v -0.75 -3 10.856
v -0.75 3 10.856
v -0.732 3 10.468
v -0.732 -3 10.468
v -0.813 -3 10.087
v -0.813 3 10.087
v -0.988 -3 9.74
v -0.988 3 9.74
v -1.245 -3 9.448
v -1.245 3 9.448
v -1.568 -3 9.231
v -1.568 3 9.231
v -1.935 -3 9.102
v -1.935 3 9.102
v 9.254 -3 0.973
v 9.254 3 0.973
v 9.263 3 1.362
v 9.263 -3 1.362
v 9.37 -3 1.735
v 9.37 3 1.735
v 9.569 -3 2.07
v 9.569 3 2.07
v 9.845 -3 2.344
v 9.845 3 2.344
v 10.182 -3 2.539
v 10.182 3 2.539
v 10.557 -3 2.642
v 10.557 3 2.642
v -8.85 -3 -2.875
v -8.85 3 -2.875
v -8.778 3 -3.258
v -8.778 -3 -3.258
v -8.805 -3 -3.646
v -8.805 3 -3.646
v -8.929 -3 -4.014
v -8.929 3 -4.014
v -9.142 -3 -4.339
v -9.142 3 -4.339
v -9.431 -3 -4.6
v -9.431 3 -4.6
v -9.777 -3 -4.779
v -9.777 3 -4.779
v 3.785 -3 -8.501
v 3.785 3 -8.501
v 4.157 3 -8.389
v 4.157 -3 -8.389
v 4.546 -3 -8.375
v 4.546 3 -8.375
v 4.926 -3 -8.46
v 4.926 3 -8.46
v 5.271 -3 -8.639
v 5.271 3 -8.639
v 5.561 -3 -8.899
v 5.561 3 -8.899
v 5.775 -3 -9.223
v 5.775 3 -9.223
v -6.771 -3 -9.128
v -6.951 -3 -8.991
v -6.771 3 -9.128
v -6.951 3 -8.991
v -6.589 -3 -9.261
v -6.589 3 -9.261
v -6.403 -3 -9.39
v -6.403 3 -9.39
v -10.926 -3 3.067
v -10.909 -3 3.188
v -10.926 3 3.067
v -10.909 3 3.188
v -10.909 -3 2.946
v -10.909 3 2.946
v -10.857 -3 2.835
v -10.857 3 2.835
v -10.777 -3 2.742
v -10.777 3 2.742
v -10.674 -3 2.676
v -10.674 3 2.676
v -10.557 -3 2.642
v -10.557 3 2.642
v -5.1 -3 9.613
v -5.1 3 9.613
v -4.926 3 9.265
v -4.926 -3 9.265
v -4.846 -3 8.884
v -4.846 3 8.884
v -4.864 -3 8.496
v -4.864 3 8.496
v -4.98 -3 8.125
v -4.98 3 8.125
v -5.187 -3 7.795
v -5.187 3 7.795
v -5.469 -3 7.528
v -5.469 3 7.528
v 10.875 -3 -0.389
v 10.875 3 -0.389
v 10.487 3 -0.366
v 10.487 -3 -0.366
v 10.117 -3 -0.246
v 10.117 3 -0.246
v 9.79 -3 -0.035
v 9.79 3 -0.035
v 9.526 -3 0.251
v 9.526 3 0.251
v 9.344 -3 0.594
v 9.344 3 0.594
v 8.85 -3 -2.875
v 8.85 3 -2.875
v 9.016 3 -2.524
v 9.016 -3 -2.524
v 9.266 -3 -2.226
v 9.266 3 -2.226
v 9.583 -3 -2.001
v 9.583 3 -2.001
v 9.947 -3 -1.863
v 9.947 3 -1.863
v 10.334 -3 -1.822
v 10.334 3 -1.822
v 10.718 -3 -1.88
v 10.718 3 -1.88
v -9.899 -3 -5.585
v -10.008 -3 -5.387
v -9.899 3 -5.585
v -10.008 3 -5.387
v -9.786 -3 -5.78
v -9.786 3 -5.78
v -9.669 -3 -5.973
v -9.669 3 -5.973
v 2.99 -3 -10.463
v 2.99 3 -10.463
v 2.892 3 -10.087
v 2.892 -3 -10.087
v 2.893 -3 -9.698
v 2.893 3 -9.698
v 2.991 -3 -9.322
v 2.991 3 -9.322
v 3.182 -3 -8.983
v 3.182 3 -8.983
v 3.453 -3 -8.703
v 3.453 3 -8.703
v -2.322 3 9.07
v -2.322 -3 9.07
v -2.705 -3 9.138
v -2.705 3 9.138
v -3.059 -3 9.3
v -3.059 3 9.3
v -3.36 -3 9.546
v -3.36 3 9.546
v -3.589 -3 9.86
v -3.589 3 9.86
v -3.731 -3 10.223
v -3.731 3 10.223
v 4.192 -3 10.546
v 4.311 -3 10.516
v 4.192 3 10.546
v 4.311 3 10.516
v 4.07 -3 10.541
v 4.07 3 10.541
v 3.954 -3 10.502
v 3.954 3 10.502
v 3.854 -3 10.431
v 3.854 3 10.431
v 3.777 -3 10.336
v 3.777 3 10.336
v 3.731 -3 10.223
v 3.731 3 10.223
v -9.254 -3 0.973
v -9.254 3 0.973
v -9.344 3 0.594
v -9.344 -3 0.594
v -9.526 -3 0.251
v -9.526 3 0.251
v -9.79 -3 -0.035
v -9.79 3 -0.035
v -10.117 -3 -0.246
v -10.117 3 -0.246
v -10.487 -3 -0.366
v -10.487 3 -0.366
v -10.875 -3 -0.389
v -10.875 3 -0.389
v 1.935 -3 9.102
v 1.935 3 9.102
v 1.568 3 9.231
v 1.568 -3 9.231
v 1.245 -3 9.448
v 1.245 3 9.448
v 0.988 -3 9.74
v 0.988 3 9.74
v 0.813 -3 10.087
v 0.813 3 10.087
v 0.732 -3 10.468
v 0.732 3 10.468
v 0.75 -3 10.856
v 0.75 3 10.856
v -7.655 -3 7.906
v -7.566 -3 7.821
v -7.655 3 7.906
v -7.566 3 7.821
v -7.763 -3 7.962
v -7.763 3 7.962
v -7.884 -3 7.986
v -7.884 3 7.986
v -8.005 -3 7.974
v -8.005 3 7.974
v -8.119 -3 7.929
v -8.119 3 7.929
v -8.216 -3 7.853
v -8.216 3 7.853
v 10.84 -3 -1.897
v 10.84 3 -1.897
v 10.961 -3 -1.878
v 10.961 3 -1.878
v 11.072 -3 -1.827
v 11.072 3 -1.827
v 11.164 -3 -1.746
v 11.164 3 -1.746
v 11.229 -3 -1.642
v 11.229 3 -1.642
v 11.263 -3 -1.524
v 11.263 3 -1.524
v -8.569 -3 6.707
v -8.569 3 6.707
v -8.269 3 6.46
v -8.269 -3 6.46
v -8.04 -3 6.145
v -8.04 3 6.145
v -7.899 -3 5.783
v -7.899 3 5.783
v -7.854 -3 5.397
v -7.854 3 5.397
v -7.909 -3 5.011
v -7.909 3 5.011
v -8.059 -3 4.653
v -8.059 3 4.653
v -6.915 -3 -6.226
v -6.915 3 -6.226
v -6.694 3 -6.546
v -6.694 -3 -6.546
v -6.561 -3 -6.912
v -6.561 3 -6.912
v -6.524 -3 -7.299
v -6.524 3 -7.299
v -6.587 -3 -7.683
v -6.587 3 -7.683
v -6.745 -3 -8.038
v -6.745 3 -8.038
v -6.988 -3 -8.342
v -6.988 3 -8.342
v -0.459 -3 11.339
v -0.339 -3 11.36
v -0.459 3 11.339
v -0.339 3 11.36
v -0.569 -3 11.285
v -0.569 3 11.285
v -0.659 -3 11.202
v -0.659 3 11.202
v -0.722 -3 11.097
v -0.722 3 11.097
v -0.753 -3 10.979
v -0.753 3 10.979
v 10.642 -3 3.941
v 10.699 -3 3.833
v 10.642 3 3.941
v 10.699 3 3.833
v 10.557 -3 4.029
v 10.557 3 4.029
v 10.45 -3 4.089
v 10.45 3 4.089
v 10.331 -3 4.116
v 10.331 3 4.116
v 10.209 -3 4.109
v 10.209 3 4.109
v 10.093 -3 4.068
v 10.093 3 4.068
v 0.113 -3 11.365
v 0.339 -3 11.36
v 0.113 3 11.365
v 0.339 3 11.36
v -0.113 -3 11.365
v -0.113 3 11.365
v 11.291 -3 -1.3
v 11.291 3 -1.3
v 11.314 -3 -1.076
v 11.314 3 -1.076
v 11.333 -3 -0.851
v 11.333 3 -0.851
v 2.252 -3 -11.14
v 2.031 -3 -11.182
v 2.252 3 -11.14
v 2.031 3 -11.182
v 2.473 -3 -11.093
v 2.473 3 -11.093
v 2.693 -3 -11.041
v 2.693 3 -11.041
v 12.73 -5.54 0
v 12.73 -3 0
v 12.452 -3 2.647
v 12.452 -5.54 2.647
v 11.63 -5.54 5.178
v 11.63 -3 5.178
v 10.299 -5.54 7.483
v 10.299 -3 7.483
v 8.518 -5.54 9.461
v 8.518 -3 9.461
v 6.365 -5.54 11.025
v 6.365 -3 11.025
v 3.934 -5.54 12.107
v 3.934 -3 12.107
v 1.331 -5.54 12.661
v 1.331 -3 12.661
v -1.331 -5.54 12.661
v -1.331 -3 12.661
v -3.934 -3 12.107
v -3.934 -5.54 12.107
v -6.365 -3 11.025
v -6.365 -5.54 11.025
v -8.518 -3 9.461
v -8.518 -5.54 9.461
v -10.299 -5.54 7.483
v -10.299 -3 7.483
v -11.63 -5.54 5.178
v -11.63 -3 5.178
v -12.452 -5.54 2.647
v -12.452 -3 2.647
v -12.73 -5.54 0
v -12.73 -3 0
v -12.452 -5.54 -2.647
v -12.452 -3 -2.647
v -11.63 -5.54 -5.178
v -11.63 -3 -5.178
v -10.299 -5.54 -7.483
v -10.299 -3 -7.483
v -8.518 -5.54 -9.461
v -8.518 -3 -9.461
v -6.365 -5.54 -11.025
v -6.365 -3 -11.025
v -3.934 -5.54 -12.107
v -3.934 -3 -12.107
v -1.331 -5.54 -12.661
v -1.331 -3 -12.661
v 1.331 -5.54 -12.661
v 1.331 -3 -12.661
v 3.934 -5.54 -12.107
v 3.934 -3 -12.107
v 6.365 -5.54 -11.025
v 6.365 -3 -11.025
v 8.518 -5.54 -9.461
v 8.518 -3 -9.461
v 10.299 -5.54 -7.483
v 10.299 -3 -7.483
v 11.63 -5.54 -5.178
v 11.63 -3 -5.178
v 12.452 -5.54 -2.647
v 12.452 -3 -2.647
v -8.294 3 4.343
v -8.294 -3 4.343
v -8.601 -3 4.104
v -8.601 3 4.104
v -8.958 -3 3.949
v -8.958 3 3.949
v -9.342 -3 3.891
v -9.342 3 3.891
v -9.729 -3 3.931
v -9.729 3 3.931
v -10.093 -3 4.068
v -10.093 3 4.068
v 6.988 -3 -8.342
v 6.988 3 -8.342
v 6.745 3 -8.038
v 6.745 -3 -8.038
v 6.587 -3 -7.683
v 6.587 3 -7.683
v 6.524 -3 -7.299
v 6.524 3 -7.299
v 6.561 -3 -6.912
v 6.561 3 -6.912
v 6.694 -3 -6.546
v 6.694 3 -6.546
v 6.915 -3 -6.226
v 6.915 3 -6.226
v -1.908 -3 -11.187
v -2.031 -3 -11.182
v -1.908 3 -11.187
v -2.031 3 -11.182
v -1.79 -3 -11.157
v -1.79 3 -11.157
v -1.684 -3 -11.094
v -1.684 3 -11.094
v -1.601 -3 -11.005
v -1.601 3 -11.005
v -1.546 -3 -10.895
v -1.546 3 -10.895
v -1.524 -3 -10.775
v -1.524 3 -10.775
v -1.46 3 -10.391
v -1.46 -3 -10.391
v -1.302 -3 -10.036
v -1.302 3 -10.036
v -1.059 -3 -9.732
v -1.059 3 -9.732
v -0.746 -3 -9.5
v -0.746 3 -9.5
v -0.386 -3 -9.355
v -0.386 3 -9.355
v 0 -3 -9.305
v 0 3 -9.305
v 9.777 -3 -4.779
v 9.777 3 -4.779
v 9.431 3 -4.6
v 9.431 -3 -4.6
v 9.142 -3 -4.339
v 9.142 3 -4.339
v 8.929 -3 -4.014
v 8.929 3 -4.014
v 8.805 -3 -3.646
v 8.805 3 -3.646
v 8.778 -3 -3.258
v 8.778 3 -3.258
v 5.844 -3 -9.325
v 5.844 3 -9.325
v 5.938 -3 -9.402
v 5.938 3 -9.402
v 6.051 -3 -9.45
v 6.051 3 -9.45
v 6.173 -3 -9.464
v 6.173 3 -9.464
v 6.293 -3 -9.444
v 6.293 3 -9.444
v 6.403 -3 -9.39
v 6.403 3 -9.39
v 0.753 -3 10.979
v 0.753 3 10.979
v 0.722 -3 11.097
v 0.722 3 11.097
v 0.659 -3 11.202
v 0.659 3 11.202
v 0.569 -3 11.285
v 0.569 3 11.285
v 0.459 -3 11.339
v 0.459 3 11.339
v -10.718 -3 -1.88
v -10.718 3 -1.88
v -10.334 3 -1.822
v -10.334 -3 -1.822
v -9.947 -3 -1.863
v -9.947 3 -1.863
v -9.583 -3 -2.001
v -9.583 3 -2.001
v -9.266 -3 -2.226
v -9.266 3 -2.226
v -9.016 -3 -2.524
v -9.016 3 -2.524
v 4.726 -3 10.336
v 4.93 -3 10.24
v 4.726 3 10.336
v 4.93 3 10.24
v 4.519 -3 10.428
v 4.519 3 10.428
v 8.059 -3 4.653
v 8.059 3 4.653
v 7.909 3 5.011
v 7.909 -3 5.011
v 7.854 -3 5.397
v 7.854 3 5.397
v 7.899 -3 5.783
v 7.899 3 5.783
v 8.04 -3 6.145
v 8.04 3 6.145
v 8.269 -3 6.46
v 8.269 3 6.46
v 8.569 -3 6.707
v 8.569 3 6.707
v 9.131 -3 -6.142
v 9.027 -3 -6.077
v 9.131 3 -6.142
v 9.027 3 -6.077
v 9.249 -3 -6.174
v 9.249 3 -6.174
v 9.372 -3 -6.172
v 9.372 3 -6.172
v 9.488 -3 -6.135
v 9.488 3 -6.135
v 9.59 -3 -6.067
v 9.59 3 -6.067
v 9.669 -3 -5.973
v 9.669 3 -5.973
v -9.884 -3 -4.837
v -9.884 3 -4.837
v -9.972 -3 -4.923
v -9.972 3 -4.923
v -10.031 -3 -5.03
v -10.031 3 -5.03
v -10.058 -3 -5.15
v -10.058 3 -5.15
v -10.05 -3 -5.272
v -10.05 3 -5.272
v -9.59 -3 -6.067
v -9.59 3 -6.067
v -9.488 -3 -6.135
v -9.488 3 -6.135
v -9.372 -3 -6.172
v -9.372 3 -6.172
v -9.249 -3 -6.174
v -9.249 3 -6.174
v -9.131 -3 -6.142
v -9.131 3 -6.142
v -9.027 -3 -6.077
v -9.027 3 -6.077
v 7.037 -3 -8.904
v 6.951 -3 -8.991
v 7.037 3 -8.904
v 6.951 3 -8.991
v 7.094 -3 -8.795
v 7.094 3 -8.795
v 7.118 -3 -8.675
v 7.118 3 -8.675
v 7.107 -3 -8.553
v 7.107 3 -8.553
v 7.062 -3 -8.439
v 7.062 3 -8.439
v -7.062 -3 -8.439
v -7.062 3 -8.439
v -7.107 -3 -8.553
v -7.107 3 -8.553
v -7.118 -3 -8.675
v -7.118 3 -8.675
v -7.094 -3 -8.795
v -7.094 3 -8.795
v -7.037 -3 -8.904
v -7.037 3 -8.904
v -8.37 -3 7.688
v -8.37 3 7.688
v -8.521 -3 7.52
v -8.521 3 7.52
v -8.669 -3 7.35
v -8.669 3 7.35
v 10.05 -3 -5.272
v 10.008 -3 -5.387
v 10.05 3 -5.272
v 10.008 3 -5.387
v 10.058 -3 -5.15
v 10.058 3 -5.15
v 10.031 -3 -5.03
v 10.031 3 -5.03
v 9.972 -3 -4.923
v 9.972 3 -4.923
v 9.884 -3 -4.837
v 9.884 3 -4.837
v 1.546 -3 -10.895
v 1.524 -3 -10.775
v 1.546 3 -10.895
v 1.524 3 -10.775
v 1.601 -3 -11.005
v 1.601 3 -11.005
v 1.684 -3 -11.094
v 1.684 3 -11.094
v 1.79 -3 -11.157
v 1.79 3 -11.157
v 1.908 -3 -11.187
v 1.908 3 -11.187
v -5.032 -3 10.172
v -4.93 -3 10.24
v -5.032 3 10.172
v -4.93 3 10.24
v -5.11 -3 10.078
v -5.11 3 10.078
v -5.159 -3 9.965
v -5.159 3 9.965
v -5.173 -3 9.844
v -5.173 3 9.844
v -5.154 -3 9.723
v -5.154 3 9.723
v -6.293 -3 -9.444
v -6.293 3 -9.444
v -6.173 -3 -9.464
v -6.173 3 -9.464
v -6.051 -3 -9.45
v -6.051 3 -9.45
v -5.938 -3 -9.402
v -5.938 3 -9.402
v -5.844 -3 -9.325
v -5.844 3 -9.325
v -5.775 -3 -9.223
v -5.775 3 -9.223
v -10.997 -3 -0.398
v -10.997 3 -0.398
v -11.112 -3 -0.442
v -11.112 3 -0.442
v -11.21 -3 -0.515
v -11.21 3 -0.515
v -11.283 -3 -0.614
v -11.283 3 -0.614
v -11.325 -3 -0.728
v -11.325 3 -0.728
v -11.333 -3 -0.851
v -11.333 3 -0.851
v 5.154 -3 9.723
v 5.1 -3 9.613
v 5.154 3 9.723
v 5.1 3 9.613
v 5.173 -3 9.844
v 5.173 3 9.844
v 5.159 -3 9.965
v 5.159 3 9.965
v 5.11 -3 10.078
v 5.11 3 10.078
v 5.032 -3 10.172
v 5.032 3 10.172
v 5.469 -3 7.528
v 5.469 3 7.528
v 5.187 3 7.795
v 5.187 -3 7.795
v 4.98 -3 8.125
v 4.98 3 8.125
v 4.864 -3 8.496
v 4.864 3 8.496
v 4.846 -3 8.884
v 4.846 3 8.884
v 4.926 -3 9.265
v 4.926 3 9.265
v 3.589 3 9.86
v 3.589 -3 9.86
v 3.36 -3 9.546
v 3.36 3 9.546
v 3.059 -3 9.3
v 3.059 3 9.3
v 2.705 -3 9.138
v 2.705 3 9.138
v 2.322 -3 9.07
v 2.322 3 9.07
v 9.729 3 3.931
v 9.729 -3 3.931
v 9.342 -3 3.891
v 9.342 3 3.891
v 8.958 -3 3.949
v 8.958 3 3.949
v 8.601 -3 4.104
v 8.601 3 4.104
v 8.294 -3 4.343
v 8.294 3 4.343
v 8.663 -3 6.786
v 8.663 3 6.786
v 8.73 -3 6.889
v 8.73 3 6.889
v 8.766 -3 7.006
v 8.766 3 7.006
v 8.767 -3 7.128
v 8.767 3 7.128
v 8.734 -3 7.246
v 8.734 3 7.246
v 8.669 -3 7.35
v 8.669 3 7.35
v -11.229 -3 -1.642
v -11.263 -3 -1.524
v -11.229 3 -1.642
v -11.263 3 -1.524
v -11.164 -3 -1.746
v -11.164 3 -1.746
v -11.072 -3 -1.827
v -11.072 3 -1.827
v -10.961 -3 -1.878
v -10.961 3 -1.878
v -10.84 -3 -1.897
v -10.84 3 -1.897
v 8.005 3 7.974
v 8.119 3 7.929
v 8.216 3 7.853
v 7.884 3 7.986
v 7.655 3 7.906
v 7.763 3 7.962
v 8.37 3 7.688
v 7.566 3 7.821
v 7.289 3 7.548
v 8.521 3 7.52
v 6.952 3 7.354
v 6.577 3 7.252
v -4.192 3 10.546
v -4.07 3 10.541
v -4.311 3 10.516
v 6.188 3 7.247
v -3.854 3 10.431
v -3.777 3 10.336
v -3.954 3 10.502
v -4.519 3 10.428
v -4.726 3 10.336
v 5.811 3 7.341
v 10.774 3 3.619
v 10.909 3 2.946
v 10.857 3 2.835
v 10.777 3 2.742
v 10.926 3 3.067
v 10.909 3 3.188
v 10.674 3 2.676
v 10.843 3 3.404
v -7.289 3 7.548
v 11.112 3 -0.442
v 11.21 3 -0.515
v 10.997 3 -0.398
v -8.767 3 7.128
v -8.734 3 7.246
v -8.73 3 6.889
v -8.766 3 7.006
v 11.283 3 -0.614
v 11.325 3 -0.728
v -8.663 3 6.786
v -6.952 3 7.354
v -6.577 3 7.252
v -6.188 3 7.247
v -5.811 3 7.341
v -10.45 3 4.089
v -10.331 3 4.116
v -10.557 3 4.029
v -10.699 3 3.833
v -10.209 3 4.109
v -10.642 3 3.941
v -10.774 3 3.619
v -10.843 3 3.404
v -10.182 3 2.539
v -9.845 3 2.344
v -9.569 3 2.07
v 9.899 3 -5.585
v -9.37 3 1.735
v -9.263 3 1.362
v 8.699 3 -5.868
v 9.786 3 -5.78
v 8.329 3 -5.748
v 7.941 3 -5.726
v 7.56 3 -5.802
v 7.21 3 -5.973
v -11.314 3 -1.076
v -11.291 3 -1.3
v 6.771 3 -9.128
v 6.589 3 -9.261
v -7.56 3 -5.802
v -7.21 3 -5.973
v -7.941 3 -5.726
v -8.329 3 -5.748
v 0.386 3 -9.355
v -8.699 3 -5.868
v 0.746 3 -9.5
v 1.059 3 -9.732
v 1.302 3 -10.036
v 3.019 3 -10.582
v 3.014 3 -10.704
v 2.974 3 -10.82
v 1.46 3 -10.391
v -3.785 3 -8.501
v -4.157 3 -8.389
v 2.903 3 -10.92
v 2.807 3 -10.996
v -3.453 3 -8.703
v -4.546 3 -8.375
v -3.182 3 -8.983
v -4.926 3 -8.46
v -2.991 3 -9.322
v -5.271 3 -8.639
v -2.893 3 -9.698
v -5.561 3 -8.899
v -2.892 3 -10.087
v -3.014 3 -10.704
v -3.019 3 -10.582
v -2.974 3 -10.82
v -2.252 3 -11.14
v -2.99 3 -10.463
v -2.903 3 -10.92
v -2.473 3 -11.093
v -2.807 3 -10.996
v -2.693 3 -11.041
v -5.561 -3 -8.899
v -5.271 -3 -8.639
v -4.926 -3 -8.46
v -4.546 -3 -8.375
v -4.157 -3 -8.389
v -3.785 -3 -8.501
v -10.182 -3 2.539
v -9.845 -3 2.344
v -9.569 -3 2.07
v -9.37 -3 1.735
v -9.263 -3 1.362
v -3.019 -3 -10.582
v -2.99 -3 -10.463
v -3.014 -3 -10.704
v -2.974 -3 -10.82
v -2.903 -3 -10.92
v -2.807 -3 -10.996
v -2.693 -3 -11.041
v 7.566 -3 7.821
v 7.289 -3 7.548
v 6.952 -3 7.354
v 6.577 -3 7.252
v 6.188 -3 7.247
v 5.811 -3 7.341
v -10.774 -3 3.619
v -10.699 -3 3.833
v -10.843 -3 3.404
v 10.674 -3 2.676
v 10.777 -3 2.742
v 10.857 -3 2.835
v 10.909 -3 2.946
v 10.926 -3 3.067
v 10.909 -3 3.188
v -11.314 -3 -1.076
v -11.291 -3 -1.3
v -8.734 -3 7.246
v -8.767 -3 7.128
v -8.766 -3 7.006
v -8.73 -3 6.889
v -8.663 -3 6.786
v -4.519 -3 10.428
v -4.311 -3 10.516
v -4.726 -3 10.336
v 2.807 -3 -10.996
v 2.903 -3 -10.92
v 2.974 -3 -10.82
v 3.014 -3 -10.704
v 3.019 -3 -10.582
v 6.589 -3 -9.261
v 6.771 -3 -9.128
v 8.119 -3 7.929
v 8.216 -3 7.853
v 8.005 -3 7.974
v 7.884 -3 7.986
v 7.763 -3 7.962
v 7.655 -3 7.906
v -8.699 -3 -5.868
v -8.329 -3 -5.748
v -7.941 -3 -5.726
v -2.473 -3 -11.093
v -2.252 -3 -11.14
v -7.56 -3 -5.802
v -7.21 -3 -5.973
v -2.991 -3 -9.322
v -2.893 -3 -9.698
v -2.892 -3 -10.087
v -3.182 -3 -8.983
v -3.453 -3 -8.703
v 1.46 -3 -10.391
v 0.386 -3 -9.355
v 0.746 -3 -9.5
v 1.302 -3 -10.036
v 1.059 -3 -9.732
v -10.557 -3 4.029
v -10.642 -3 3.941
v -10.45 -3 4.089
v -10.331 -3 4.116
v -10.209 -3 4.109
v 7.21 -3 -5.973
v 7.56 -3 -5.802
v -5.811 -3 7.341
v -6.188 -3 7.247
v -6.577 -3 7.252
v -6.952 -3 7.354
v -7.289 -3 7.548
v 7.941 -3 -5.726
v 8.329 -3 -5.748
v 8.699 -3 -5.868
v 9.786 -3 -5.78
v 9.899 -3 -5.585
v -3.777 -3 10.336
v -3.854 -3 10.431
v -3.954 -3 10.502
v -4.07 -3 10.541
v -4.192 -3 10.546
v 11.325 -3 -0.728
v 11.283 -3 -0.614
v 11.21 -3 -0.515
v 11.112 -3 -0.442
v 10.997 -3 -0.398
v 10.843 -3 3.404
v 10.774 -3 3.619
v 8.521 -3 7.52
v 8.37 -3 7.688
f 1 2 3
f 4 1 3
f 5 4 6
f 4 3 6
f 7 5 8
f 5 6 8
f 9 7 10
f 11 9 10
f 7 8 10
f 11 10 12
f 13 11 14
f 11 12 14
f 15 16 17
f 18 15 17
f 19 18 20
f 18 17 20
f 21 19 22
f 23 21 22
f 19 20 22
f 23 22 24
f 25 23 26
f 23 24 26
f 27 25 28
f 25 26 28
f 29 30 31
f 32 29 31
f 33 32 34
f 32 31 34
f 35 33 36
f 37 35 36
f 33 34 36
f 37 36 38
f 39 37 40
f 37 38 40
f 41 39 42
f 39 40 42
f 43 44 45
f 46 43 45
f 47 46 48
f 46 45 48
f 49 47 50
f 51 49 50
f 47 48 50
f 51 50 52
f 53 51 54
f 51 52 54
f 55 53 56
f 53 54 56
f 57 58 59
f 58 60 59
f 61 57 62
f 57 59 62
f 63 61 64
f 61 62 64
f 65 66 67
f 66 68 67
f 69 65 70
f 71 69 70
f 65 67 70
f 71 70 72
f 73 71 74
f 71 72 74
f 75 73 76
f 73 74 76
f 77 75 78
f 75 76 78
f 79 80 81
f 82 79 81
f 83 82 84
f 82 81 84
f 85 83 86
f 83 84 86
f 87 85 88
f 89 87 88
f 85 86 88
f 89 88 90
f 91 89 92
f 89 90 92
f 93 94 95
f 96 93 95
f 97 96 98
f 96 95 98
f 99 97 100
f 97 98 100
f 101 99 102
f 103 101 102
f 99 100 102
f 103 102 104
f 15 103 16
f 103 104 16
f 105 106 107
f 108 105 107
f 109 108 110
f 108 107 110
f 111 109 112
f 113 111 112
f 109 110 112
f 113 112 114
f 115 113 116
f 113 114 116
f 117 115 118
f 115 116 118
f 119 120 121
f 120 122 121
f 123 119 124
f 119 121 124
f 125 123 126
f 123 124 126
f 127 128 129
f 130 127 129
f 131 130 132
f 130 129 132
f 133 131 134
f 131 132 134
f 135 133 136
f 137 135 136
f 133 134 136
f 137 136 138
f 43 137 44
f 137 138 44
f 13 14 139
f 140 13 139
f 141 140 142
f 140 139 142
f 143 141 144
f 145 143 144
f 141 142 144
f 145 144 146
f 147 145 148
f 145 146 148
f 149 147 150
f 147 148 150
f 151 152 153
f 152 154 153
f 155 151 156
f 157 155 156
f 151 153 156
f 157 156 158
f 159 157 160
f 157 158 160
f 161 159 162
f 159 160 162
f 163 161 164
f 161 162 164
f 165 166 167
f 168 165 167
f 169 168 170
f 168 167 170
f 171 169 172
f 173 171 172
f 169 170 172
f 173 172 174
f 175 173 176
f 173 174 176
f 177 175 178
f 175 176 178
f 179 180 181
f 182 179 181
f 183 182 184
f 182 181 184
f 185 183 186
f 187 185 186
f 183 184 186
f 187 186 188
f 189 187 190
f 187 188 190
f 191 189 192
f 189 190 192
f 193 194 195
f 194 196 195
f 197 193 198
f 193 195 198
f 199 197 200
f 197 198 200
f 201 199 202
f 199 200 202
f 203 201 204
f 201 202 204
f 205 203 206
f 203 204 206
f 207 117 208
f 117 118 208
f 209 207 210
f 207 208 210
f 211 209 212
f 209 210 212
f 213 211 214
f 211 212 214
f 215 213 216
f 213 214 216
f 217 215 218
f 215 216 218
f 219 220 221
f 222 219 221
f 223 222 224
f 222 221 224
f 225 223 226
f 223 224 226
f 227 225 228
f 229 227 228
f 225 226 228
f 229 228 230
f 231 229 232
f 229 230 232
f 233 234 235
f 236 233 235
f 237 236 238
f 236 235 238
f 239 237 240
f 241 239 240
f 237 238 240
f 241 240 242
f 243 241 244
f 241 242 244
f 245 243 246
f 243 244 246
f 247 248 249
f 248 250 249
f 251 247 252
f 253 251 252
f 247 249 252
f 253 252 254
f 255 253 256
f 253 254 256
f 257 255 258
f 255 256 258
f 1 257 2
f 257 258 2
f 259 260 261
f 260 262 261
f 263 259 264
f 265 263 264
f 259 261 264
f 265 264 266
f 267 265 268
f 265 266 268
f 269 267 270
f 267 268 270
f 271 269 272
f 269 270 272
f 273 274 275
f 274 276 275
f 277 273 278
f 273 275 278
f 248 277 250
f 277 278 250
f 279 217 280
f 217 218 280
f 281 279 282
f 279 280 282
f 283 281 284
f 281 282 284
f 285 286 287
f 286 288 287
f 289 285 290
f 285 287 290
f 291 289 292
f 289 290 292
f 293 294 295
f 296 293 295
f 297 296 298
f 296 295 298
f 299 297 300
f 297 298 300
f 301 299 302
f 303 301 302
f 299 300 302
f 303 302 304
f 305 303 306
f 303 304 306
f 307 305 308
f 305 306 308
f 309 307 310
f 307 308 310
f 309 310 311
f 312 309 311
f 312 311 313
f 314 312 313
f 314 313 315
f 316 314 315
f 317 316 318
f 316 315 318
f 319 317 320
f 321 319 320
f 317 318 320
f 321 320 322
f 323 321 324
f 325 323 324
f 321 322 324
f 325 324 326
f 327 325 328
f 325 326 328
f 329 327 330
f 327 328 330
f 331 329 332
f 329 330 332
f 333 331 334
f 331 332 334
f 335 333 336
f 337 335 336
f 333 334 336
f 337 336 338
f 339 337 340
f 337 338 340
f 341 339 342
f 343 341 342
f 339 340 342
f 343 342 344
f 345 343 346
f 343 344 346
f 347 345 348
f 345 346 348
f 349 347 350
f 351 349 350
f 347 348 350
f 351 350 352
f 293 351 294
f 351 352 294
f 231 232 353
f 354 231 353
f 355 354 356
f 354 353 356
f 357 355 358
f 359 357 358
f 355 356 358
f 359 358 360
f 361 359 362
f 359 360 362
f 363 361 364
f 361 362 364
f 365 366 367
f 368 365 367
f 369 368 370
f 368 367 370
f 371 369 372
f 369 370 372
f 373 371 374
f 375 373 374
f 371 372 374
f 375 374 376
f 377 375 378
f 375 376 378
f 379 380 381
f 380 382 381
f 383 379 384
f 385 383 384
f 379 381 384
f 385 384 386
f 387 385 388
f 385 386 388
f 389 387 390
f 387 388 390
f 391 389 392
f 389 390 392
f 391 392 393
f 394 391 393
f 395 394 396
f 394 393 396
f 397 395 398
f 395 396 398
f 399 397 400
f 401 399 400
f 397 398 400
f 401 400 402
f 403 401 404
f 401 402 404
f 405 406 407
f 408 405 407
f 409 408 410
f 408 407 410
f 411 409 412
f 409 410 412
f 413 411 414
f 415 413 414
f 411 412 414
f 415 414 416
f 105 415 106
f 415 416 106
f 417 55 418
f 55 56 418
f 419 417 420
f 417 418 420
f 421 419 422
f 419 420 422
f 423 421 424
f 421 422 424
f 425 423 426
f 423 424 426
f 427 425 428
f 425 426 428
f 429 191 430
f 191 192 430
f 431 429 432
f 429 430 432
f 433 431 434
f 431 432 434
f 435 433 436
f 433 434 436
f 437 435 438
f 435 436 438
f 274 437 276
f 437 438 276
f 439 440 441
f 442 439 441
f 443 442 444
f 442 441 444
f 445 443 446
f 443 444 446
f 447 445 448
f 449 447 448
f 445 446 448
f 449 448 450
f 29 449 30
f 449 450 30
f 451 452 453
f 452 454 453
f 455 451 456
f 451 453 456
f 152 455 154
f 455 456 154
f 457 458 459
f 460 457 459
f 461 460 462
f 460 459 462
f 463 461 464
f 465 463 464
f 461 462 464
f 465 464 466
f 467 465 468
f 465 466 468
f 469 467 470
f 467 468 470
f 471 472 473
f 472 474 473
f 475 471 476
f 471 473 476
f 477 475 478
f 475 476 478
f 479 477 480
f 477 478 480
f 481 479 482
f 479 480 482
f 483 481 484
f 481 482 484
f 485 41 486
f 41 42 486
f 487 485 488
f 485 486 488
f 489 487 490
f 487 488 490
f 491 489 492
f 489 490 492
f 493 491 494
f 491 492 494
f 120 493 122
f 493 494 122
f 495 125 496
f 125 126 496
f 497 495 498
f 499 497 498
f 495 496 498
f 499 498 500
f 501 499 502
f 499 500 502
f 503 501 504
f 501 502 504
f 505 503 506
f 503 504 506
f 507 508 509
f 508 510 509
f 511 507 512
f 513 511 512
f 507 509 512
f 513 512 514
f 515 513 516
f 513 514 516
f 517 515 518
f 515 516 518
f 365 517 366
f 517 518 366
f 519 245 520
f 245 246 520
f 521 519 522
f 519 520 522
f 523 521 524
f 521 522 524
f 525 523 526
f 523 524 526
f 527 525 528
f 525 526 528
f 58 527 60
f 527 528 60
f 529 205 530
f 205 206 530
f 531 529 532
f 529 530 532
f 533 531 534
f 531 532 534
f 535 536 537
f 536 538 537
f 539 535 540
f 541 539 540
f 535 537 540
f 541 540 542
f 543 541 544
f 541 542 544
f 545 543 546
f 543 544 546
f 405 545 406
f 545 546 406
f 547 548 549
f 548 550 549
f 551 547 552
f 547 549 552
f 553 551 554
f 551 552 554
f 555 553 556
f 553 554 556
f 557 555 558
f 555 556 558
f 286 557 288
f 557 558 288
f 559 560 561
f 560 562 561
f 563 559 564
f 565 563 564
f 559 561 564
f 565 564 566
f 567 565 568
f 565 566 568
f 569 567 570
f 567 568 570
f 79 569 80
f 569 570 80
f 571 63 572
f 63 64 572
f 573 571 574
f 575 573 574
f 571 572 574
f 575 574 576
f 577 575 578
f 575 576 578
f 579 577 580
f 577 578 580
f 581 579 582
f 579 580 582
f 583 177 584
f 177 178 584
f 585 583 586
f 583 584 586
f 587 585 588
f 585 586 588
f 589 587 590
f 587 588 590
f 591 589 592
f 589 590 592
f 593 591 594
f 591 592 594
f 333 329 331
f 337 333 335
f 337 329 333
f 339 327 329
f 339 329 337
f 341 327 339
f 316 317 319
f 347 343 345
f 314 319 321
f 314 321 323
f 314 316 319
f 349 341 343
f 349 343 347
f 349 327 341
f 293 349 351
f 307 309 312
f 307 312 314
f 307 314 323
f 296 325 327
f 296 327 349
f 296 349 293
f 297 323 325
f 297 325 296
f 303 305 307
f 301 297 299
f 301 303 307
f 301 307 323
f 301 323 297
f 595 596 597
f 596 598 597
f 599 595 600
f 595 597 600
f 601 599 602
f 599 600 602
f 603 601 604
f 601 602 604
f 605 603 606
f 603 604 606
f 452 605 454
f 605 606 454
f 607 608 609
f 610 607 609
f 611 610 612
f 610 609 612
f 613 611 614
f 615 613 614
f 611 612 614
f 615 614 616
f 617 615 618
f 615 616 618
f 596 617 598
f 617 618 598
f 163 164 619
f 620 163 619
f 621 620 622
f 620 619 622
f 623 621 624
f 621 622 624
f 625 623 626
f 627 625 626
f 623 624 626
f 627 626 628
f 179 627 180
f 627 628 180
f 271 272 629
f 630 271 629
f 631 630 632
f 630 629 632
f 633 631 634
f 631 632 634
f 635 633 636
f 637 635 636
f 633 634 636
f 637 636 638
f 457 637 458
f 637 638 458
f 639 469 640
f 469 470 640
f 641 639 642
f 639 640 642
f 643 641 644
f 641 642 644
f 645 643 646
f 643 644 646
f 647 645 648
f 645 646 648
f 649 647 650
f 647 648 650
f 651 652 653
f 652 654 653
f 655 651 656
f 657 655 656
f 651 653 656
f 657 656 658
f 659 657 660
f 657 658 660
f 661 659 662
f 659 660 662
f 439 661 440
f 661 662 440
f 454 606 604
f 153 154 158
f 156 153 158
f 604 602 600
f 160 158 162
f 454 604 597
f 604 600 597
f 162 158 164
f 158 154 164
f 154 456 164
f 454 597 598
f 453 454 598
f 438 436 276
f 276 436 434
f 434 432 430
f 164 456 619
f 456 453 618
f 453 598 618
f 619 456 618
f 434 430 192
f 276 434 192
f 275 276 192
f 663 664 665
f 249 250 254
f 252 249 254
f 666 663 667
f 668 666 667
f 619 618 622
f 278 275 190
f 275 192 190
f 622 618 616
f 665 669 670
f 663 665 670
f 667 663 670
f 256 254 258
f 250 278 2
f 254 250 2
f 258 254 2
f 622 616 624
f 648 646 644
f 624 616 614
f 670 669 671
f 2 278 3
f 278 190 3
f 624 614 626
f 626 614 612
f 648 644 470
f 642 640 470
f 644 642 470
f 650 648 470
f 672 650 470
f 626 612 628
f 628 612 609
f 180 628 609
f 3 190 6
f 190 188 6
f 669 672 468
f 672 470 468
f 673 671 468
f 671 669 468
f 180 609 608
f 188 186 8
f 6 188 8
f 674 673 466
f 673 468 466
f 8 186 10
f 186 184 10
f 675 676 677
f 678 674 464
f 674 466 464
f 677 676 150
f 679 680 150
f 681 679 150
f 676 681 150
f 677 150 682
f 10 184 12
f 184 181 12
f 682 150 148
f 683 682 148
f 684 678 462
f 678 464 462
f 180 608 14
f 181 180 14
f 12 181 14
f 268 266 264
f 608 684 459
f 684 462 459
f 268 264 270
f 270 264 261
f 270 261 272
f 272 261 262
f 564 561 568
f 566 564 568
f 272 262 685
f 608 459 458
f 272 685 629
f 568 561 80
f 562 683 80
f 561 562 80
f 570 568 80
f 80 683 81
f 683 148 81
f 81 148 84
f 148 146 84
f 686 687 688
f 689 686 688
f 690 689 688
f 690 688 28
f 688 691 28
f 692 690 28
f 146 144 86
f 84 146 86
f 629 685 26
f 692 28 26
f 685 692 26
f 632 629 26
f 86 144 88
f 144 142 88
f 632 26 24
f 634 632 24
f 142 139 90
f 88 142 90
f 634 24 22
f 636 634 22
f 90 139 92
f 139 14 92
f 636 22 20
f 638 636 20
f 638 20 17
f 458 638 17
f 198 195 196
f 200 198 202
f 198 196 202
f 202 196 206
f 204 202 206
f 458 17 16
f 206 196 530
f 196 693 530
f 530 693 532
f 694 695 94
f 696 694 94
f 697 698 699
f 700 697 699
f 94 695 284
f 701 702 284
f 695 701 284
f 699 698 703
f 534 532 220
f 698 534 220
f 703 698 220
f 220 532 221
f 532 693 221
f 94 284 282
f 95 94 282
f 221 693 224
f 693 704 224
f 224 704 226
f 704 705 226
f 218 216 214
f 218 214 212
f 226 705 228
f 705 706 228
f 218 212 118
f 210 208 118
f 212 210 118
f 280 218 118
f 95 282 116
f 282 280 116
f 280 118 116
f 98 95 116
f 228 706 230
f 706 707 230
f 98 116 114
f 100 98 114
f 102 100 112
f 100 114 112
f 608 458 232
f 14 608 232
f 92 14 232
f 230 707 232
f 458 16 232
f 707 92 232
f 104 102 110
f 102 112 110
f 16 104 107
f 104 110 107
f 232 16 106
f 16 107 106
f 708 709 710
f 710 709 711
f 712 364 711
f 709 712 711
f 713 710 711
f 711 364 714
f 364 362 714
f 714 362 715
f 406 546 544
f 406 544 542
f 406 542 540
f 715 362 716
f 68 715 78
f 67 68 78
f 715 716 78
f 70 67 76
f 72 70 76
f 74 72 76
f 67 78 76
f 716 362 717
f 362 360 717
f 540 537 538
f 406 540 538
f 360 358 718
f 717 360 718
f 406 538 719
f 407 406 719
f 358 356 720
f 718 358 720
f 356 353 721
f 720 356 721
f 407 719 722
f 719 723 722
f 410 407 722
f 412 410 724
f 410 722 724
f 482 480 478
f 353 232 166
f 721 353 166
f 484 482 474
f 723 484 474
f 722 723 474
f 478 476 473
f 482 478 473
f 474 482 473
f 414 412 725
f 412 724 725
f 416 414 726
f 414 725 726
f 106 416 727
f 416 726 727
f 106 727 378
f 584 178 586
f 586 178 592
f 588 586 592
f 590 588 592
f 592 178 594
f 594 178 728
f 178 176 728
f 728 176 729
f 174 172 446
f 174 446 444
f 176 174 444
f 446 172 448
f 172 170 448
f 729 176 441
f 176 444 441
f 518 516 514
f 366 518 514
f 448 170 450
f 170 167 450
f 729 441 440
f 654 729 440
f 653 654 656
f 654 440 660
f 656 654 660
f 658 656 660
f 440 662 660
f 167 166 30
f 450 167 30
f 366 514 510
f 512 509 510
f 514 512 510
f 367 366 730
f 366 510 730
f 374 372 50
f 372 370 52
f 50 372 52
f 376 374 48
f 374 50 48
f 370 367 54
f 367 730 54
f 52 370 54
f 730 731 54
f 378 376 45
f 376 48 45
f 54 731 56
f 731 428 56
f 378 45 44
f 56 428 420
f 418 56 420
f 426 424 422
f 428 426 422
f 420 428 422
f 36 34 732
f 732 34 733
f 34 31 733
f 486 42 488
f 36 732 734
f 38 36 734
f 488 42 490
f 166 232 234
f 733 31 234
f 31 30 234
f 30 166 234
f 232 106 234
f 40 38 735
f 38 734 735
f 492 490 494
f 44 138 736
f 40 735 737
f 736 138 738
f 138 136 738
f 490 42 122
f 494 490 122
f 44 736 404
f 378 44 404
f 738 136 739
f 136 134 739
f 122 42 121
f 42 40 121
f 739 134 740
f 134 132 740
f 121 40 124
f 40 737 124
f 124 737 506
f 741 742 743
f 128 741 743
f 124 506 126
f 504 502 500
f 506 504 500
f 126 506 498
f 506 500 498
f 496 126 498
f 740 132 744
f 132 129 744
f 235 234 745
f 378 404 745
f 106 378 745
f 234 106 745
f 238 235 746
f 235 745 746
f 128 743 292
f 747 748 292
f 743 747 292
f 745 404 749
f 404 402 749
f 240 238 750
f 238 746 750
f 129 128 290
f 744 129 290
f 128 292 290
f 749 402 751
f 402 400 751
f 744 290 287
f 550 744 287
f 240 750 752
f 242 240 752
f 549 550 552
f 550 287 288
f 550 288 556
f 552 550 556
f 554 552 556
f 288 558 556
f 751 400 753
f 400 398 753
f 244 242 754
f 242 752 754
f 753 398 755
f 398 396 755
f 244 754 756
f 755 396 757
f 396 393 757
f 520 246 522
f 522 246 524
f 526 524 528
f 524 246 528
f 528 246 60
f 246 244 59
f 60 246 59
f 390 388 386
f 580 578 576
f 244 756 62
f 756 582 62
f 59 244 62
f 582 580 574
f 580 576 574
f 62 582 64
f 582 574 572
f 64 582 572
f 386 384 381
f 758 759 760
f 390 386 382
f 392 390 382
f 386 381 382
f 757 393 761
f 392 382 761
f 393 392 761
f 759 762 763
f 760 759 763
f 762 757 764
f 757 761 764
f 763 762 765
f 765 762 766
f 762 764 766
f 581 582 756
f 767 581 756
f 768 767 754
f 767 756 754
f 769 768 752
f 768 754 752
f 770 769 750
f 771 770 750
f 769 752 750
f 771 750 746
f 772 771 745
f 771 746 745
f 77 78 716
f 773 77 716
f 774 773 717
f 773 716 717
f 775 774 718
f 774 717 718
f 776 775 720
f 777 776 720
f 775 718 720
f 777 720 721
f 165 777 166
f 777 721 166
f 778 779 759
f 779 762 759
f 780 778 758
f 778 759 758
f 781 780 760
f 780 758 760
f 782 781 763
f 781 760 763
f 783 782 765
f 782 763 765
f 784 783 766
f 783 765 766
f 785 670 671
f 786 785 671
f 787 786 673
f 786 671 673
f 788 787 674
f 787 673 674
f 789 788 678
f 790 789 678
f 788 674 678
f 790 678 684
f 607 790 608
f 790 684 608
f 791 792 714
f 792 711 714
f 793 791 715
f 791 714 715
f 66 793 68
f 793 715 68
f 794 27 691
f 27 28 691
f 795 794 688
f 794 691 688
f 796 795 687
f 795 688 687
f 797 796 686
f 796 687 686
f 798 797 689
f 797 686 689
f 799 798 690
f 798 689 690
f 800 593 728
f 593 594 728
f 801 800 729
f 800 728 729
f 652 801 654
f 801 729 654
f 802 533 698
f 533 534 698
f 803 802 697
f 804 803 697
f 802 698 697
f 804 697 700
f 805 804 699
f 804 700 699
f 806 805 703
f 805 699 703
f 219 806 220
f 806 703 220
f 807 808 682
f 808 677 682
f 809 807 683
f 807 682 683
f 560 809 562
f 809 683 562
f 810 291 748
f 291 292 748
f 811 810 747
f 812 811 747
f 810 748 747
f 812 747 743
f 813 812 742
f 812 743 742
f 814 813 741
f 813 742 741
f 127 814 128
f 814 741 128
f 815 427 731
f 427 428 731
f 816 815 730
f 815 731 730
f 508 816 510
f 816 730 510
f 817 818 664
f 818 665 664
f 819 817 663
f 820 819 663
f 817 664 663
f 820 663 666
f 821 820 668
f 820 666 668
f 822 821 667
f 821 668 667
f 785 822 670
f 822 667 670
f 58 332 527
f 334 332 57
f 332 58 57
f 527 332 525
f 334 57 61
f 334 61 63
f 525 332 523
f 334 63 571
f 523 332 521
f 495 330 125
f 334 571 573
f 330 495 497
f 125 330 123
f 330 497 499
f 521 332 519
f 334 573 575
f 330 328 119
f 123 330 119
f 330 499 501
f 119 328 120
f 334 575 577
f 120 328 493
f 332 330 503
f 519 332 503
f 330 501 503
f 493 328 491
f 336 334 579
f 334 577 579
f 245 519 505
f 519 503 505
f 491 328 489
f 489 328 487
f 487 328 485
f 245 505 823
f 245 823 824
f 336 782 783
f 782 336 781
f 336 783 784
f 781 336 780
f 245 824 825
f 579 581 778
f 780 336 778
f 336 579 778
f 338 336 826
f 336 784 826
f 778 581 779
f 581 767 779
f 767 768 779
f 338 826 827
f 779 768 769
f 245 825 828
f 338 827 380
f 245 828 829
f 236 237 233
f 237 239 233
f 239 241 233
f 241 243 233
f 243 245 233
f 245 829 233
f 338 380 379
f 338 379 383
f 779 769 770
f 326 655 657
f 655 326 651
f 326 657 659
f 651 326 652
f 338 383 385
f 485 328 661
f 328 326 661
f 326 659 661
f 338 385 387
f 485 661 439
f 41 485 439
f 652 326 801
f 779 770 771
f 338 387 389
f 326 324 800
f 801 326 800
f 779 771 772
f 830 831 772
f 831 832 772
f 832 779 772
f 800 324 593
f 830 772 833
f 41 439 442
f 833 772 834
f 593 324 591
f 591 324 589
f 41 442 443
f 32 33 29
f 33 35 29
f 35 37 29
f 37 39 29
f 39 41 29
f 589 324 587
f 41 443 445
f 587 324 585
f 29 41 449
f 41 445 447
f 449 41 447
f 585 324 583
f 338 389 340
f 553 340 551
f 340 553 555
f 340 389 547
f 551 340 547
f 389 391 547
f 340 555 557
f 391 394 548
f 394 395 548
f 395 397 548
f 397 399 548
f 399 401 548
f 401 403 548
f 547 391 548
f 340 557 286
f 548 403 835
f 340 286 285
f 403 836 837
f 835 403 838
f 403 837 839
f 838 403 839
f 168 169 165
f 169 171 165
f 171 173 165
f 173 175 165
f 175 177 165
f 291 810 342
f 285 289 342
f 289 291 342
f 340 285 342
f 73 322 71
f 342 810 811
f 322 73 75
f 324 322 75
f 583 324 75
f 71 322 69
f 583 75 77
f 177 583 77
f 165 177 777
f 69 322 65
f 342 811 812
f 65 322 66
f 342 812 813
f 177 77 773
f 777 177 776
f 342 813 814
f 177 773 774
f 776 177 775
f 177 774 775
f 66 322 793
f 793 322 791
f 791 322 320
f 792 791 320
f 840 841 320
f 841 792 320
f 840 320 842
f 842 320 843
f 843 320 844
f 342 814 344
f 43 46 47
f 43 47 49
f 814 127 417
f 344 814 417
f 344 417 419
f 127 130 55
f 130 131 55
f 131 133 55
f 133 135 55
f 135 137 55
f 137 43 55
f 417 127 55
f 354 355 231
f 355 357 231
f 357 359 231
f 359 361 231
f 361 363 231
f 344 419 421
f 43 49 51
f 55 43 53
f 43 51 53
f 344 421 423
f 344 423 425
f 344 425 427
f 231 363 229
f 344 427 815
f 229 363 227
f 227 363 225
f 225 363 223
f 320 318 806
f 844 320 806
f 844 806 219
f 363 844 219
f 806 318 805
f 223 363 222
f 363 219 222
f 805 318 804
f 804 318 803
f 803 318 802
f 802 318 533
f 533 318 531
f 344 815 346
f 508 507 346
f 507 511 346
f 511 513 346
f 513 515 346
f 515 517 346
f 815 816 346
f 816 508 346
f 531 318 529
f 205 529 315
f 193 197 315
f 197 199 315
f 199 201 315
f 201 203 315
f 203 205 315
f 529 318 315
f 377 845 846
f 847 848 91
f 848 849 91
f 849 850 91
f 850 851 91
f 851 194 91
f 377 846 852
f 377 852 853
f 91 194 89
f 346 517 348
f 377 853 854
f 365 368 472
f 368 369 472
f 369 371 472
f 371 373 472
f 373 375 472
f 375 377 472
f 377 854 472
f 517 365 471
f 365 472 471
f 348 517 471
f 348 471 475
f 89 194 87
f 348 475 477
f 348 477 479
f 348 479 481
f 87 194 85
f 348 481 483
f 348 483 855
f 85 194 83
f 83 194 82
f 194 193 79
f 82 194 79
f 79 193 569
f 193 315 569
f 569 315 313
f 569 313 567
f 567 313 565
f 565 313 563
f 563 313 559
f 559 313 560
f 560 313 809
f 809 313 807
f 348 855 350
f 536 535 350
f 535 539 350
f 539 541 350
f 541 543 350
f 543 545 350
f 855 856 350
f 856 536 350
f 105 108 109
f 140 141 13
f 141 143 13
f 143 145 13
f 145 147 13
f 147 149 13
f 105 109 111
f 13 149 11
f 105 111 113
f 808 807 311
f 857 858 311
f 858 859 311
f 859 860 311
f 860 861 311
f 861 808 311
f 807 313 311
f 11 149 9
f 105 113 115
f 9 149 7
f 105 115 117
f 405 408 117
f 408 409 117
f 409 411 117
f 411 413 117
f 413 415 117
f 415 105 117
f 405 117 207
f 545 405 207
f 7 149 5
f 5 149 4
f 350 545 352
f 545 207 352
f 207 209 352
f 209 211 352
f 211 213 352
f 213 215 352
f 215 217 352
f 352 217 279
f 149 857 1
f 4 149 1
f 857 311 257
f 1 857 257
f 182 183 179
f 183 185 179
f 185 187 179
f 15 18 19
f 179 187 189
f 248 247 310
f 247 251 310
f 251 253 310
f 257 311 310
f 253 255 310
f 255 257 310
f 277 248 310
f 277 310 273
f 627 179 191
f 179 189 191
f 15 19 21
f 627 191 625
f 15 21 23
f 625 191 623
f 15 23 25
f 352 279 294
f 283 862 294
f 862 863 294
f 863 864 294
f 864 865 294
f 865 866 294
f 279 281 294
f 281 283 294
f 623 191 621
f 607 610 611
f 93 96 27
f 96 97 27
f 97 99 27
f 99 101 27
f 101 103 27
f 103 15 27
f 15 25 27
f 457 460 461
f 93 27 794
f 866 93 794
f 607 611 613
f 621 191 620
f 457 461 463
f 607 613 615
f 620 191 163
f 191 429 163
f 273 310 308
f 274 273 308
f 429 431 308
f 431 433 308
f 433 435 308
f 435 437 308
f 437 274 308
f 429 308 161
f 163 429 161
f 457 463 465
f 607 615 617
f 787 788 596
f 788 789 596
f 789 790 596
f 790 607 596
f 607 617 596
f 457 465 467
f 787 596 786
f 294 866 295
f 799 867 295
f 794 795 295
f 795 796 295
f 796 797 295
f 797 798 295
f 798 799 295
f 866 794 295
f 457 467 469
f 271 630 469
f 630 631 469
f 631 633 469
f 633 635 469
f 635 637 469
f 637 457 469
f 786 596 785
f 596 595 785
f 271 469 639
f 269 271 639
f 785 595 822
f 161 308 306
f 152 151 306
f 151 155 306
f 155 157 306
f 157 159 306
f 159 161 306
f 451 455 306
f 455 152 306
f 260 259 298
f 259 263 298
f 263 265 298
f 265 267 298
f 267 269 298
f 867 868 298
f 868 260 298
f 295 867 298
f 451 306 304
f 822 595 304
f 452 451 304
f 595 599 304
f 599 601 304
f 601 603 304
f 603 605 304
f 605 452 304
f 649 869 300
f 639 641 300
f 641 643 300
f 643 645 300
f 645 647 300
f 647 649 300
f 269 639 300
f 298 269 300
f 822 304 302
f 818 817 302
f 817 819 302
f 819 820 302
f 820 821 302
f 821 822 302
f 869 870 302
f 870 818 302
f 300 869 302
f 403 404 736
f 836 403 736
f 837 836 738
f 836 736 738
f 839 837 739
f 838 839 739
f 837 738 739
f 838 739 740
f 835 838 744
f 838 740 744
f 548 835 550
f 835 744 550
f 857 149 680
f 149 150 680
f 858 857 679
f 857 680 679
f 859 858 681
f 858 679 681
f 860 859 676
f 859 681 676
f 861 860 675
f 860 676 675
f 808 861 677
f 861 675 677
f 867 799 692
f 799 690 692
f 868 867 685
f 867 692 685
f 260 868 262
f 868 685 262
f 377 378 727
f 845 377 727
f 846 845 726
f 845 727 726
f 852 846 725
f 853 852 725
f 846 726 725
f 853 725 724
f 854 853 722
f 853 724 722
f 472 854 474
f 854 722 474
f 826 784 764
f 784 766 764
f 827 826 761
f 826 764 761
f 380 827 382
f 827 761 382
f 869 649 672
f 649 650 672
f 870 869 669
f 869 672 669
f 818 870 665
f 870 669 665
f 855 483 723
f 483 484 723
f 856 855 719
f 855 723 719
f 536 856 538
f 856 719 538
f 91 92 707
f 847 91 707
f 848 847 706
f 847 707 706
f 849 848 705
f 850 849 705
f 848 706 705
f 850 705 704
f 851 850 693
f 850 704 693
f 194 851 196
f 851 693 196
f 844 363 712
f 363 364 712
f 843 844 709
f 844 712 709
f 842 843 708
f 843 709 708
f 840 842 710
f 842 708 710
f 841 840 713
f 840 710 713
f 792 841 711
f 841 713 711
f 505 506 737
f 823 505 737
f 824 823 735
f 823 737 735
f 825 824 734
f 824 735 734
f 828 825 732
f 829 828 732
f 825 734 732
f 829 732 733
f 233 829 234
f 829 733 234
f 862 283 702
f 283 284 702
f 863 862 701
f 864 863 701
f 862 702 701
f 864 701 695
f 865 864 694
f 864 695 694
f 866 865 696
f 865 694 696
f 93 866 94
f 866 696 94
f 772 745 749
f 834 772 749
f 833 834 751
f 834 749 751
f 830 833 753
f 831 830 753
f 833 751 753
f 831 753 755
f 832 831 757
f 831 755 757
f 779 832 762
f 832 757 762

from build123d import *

# Parameters (mm, degrees)
BOSS_EXTRUDE1_DEPTH = 3
CIRPATTERN1_COUNT   = 15
SKETCH2_R           = 12.73044952
BOSS_EXTRUDE2_DEPTH = 2.54


with BuildPart() as part:
    # Sketch1 → Boss-Extrude1 (new, symmetric)
    with BuildSketch(Plane(origin=(0, 0, 0), x_dir=(1, 0, 0), z_dir=(0, 1, 0))):
        with BuildLine():
            ThreePointArc((0, 9.305199576), (1.058591657, 9.732470692), (1.52399559, 10.774860293))
            ThreePointArc((1.52399559, 10.774860293), (1.684189321, 11.094304623), (2.030537225, 11.182337802))
            ThreePointArc((2.030537225, 11.182337802), (2.362957849, 11.116842642), (2.693278481, 11.041467799))
            ThreePointArc((2.693278481, 11.041467799), (2.973876716, 10.820173105), (2.990291257, 10.463189528))
            ThreePointArc((2.990291257, 10.463189528), (2.991480859, 9.321622409), (3.784765639, 8.500722805))
            ThreePointArc((3.784765639, 8.500722805), (-1.934659777, -9.10185864), (0, 9.305199576))
        make_face()
    boss_extrude1 = extrude(amount=BOSS_EXTRUDE1_DEPTH, both=True)

    # CirPattern1: Boss-Extrude1 ×15 about axis
    cirpattern1_axis = Axis((0, 3.3, 0), (0, -1, 0))
    for i in range(1, CIRPATTERN1_COUNT):
        add(boss_extrude1.rotate(cirpattern1_axis, i * 360 / CIRPATTERN1_COUNT))

    # Sketch2 → Boss-Extrude2 (add)
    with BuildSketch(Plane.XZ.offset(3)):
        Circle(SKETCH2_R)
    extrude(amount=BOSS_EXTRUDE2_DEPTH)


solid = part.part
